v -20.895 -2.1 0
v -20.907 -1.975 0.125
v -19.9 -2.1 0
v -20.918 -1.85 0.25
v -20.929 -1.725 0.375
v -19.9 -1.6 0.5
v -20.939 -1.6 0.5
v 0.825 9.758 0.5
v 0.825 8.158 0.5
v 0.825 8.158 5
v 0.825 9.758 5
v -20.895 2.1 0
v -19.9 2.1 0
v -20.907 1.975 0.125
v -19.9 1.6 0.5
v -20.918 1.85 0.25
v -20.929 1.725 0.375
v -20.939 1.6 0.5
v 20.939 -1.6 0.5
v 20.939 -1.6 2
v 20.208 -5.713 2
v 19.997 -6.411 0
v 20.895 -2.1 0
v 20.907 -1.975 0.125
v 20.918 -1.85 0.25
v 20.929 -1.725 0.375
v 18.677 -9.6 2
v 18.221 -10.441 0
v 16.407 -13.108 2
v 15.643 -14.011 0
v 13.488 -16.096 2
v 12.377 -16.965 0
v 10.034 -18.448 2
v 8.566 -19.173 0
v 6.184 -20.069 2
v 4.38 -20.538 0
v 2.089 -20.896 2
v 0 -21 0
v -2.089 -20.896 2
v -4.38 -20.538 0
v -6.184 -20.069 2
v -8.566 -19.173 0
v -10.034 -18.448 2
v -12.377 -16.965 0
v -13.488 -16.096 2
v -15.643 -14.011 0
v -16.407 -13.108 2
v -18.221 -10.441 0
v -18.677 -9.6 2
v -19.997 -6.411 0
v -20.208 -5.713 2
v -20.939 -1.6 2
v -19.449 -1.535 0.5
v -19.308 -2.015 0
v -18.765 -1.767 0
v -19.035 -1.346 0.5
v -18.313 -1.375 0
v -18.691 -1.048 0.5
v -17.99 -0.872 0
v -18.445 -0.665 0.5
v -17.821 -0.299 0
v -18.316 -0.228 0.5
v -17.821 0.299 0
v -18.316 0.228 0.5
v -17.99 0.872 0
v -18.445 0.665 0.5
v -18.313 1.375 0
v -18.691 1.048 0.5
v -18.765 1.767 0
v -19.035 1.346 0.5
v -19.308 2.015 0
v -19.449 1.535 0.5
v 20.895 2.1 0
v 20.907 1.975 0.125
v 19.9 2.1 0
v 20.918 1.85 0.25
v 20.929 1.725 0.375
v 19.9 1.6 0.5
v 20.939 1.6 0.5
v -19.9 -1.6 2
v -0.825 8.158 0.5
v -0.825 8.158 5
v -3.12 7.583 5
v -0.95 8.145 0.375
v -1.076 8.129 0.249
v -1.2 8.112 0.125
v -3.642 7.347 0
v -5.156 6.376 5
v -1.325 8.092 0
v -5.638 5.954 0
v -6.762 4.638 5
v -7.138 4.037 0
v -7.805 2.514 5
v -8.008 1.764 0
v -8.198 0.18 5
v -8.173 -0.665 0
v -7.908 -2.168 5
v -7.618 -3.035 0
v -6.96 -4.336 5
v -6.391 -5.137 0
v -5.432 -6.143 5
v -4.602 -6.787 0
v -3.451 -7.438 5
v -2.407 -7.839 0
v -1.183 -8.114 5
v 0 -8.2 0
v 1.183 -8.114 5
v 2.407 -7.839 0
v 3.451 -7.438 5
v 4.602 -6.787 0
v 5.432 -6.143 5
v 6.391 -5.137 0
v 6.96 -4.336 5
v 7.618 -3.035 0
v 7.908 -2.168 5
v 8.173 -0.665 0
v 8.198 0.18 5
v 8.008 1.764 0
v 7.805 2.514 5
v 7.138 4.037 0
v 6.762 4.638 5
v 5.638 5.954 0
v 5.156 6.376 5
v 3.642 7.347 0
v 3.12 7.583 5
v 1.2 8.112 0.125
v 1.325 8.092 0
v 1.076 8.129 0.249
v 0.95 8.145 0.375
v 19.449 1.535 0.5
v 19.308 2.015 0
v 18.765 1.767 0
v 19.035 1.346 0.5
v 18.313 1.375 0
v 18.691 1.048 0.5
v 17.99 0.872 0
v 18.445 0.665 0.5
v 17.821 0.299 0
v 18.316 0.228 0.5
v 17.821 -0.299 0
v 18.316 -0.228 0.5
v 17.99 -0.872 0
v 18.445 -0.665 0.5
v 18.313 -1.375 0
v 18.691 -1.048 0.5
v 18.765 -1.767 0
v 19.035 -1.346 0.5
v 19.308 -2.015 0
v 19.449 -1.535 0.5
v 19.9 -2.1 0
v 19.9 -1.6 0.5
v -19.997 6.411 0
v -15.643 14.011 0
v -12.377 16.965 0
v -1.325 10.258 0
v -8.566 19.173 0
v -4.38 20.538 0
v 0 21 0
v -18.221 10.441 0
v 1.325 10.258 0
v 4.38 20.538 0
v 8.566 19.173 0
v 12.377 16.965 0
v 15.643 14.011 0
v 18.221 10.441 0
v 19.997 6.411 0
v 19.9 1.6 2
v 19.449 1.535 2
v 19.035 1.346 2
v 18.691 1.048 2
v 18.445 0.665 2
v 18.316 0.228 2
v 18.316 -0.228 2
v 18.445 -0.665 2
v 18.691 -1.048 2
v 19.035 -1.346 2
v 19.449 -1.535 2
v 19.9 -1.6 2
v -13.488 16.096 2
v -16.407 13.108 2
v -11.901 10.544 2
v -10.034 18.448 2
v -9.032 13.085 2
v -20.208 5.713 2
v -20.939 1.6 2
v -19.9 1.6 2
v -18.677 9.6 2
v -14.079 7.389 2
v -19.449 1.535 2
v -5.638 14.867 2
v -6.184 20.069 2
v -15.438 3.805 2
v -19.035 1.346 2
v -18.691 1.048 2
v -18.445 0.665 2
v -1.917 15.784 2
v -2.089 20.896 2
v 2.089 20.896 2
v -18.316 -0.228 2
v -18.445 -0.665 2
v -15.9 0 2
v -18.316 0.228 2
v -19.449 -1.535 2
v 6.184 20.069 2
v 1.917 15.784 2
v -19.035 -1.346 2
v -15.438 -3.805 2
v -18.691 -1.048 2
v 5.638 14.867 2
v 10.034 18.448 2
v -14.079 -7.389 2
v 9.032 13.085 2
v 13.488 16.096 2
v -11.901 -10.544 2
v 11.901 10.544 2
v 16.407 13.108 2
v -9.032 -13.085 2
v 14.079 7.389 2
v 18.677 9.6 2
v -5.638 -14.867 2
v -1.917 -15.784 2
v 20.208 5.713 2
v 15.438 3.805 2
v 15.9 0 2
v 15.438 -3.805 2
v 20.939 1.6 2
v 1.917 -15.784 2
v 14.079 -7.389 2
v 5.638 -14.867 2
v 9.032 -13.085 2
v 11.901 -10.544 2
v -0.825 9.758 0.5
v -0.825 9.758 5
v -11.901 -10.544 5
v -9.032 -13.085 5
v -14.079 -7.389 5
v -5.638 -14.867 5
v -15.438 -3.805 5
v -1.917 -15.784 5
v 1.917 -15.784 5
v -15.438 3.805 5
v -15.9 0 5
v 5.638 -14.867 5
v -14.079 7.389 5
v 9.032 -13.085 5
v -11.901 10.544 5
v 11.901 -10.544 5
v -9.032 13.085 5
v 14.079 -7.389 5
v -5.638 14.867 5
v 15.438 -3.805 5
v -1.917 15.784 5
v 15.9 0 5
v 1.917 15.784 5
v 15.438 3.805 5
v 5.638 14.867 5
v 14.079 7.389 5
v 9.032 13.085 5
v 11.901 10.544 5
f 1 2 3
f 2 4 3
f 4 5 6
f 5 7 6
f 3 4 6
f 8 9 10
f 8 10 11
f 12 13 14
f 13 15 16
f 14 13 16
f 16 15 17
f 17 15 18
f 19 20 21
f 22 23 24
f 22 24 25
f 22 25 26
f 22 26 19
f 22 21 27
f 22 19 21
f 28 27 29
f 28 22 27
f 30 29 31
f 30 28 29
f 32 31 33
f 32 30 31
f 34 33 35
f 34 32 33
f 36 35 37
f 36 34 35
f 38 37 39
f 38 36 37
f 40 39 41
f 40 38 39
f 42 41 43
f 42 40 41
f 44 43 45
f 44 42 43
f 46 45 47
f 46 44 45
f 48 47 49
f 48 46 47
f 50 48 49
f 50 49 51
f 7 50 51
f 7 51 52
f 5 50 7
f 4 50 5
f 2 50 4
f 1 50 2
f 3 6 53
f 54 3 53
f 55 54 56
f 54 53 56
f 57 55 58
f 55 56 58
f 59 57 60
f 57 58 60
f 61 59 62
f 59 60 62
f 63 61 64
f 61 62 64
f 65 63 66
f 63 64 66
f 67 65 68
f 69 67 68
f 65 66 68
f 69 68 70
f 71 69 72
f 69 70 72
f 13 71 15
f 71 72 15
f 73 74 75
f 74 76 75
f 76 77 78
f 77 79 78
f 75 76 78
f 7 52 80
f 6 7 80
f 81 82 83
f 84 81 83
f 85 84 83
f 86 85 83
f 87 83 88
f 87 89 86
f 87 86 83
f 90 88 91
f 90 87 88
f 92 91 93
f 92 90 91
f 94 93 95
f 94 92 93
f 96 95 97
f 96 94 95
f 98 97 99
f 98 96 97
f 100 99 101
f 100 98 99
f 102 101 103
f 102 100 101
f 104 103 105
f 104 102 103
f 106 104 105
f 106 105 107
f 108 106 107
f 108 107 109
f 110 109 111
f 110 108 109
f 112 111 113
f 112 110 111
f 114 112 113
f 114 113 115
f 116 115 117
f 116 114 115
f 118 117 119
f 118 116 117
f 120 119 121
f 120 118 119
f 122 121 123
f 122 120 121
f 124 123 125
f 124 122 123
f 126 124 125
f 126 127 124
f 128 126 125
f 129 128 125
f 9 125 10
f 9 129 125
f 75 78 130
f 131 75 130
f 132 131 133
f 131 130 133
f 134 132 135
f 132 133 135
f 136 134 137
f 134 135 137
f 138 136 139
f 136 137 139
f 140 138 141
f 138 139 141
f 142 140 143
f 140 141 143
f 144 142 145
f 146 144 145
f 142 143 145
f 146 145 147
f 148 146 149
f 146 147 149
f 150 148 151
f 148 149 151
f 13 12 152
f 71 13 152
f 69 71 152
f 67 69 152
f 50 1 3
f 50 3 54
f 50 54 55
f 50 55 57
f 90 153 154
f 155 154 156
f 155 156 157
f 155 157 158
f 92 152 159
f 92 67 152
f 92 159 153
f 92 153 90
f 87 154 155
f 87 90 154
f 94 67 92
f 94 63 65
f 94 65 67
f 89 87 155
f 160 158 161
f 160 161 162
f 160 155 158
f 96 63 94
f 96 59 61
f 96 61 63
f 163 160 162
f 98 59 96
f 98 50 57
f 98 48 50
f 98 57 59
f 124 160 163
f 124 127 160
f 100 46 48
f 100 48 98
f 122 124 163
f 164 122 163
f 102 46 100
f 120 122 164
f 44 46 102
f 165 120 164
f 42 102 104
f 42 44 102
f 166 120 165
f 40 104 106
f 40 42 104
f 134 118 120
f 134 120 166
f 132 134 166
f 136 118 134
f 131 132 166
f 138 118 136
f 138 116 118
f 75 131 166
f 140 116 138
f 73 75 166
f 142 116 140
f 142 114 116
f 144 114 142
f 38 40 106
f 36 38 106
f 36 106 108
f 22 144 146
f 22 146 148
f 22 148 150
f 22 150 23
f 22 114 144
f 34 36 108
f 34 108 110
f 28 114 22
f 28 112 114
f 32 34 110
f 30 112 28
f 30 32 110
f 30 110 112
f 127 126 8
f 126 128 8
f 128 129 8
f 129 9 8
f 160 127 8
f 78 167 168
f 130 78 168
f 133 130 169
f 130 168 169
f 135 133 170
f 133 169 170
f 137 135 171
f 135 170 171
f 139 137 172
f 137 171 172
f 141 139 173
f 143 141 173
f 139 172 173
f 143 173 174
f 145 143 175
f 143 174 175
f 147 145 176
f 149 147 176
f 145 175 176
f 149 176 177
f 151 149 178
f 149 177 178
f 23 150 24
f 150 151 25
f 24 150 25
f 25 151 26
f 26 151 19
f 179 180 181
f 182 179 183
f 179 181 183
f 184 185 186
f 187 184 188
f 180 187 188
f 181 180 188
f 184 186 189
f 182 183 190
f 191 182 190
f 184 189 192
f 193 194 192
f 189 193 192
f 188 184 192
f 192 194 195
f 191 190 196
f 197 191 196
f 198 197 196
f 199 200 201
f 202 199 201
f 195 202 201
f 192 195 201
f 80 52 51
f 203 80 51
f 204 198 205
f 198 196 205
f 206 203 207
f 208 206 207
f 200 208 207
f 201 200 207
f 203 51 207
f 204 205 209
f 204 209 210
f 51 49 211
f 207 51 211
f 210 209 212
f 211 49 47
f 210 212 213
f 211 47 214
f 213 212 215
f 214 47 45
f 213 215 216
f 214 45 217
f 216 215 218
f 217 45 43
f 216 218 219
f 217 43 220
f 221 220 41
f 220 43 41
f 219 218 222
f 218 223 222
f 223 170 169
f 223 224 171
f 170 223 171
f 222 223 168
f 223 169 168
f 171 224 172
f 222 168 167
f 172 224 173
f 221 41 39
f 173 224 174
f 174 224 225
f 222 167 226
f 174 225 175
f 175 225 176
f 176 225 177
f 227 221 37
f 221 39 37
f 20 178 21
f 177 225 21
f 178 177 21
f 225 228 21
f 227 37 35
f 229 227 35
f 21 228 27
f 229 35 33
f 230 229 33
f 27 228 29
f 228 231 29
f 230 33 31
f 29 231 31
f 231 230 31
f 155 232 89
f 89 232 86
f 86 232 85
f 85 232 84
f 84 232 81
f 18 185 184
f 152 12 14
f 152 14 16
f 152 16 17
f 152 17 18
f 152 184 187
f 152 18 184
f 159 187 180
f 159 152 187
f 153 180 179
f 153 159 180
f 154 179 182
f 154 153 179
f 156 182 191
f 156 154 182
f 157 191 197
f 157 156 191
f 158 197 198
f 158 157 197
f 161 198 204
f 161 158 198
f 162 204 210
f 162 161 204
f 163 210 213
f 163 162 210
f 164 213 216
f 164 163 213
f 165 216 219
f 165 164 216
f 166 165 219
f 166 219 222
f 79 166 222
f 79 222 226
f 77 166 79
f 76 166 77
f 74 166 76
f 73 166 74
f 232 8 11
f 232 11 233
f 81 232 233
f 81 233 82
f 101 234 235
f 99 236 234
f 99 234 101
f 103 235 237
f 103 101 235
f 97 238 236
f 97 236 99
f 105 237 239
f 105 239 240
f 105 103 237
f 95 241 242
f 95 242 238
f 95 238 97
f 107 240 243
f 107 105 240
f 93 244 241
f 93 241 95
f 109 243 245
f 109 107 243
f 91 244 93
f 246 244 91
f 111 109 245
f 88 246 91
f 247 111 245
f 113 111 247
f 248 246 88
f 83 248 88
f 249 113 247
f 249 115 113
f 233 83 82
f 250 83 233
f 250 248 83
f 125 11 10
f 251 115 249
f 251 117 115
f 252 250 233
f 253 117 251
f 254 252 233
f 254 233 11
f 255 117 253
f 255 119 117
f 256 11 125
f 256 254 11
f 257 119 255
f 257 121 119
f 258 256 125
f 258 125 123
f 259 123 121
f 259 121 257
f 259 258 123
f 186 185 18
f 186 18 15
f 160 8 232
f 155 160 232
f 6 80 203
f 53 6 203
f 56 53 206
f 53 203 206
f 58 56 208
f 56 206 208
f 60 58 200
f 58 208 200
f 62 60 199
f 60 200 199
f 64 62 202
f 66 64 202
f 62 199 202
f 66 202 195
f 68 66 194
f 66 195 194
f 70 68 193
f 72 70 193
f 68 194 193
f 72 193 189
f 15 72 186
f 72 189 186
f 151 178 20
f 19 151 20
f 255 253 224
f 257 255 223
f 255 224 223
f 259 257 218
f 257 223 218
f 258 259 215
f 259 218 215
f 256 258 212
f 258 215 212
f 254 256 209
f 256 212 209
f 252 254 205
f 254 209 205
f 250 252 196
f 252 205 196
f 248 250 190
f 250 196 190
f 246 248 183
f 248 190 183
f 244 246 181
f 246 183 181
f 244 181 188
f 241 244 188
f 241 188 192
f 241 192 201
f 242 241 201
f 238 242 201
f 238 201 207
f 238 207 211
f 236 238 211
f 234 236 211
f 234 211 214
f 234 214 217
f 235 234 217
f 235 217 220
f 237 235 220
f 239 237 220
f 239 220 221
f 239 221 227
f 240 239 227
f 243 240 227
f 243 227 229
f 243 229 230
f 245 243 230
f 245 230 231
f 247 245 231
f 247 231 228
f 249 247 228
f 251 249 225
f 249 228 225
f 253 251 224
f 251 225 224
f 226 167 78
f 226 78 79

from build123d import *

# Parameters (mm, degrees)
SKETCH_R      = 15.9
PAD_DEPTH     = 5
SKETCH001_R   = 21
SKETCH001_R_2 = 15.9
PAD001_DEPTH  = 2
POCKET_DEPTH  = 5
CHAMFER_SIZE  = 0.5


with BuildPart() as part:
    # Sketch → Pad (new body)
    with BuildSketch(Plane.XY):
        Circle(SKETCH_R)
        with BuildLine():
            Line((0.825, 8.158393), (0.825, 9.758393))
            Line((0.825, 9.758393), (-0.825, 9.758393))
            Line((-0.825, 9.758393), (-0.825, 8.158393))
            ThreePointArc((-0.825, 8.158393), (0, -8.2), (0.825, 8.158393))
        make_face(mode=Mode.SUBTRACT)
    extrude(amount=PAD_DEPTH)

    # Sketch001 → Pad001 (new body)
    with BuildSketch(Plane(origin=(0, 0, 0), x_dir=(1, 0, 0), z_dir=(0, 0, -1))):
        Circle(SKETCH001_R)
        Circle(SKETCH001_R_2, mode=Mode.SUBTRACT)
    extrude(amount=-PAD001_DEPTH)

    # Sketch002 → Pocket (cut)
    with BuildSketch(Plane.XY.offset(2)):
        with BuildLine():
            ThreePointArc((-19.9, -1.6), (-18.3, 0), (-19.9, 1.6))
            Line((-21.9, 1.6), (-19.9, 1.6))
            Line((-21.9, 1.6), (-21.9, -1.6))
            Line((-21.9, -1.6), (-19.9, -1.6))
        make_face()
        with BuildLine():
            ThreePointArc((19.9, 1.6), (18.3, 0), (19.9, -1.6))
            Line((19.9, -1.6), (21.9, -1.6))
            Line((21.9, 1.6), (21.9, -1.6))
            Line((19.9, 1.6), (21.9, 1.6))
        make_face()
    extrude(amount=-POCKET_DEPTH, mode=Mode.SUBTRACT)

    # Chamfer
    chamfer_edges = [part.edges().sort_by_distance(p)[0] for p in [
        (0.825, 8.958393, 0),
        (0, 9.758393, 0),
        (-0.825, 8.958393, 0),
        (-18.3, 0, 0),
        (18.3, 0, 0),
    ]]
    chamfer(chamfer_edges, length=CHAMFER_SIZE)


solid = part.part
